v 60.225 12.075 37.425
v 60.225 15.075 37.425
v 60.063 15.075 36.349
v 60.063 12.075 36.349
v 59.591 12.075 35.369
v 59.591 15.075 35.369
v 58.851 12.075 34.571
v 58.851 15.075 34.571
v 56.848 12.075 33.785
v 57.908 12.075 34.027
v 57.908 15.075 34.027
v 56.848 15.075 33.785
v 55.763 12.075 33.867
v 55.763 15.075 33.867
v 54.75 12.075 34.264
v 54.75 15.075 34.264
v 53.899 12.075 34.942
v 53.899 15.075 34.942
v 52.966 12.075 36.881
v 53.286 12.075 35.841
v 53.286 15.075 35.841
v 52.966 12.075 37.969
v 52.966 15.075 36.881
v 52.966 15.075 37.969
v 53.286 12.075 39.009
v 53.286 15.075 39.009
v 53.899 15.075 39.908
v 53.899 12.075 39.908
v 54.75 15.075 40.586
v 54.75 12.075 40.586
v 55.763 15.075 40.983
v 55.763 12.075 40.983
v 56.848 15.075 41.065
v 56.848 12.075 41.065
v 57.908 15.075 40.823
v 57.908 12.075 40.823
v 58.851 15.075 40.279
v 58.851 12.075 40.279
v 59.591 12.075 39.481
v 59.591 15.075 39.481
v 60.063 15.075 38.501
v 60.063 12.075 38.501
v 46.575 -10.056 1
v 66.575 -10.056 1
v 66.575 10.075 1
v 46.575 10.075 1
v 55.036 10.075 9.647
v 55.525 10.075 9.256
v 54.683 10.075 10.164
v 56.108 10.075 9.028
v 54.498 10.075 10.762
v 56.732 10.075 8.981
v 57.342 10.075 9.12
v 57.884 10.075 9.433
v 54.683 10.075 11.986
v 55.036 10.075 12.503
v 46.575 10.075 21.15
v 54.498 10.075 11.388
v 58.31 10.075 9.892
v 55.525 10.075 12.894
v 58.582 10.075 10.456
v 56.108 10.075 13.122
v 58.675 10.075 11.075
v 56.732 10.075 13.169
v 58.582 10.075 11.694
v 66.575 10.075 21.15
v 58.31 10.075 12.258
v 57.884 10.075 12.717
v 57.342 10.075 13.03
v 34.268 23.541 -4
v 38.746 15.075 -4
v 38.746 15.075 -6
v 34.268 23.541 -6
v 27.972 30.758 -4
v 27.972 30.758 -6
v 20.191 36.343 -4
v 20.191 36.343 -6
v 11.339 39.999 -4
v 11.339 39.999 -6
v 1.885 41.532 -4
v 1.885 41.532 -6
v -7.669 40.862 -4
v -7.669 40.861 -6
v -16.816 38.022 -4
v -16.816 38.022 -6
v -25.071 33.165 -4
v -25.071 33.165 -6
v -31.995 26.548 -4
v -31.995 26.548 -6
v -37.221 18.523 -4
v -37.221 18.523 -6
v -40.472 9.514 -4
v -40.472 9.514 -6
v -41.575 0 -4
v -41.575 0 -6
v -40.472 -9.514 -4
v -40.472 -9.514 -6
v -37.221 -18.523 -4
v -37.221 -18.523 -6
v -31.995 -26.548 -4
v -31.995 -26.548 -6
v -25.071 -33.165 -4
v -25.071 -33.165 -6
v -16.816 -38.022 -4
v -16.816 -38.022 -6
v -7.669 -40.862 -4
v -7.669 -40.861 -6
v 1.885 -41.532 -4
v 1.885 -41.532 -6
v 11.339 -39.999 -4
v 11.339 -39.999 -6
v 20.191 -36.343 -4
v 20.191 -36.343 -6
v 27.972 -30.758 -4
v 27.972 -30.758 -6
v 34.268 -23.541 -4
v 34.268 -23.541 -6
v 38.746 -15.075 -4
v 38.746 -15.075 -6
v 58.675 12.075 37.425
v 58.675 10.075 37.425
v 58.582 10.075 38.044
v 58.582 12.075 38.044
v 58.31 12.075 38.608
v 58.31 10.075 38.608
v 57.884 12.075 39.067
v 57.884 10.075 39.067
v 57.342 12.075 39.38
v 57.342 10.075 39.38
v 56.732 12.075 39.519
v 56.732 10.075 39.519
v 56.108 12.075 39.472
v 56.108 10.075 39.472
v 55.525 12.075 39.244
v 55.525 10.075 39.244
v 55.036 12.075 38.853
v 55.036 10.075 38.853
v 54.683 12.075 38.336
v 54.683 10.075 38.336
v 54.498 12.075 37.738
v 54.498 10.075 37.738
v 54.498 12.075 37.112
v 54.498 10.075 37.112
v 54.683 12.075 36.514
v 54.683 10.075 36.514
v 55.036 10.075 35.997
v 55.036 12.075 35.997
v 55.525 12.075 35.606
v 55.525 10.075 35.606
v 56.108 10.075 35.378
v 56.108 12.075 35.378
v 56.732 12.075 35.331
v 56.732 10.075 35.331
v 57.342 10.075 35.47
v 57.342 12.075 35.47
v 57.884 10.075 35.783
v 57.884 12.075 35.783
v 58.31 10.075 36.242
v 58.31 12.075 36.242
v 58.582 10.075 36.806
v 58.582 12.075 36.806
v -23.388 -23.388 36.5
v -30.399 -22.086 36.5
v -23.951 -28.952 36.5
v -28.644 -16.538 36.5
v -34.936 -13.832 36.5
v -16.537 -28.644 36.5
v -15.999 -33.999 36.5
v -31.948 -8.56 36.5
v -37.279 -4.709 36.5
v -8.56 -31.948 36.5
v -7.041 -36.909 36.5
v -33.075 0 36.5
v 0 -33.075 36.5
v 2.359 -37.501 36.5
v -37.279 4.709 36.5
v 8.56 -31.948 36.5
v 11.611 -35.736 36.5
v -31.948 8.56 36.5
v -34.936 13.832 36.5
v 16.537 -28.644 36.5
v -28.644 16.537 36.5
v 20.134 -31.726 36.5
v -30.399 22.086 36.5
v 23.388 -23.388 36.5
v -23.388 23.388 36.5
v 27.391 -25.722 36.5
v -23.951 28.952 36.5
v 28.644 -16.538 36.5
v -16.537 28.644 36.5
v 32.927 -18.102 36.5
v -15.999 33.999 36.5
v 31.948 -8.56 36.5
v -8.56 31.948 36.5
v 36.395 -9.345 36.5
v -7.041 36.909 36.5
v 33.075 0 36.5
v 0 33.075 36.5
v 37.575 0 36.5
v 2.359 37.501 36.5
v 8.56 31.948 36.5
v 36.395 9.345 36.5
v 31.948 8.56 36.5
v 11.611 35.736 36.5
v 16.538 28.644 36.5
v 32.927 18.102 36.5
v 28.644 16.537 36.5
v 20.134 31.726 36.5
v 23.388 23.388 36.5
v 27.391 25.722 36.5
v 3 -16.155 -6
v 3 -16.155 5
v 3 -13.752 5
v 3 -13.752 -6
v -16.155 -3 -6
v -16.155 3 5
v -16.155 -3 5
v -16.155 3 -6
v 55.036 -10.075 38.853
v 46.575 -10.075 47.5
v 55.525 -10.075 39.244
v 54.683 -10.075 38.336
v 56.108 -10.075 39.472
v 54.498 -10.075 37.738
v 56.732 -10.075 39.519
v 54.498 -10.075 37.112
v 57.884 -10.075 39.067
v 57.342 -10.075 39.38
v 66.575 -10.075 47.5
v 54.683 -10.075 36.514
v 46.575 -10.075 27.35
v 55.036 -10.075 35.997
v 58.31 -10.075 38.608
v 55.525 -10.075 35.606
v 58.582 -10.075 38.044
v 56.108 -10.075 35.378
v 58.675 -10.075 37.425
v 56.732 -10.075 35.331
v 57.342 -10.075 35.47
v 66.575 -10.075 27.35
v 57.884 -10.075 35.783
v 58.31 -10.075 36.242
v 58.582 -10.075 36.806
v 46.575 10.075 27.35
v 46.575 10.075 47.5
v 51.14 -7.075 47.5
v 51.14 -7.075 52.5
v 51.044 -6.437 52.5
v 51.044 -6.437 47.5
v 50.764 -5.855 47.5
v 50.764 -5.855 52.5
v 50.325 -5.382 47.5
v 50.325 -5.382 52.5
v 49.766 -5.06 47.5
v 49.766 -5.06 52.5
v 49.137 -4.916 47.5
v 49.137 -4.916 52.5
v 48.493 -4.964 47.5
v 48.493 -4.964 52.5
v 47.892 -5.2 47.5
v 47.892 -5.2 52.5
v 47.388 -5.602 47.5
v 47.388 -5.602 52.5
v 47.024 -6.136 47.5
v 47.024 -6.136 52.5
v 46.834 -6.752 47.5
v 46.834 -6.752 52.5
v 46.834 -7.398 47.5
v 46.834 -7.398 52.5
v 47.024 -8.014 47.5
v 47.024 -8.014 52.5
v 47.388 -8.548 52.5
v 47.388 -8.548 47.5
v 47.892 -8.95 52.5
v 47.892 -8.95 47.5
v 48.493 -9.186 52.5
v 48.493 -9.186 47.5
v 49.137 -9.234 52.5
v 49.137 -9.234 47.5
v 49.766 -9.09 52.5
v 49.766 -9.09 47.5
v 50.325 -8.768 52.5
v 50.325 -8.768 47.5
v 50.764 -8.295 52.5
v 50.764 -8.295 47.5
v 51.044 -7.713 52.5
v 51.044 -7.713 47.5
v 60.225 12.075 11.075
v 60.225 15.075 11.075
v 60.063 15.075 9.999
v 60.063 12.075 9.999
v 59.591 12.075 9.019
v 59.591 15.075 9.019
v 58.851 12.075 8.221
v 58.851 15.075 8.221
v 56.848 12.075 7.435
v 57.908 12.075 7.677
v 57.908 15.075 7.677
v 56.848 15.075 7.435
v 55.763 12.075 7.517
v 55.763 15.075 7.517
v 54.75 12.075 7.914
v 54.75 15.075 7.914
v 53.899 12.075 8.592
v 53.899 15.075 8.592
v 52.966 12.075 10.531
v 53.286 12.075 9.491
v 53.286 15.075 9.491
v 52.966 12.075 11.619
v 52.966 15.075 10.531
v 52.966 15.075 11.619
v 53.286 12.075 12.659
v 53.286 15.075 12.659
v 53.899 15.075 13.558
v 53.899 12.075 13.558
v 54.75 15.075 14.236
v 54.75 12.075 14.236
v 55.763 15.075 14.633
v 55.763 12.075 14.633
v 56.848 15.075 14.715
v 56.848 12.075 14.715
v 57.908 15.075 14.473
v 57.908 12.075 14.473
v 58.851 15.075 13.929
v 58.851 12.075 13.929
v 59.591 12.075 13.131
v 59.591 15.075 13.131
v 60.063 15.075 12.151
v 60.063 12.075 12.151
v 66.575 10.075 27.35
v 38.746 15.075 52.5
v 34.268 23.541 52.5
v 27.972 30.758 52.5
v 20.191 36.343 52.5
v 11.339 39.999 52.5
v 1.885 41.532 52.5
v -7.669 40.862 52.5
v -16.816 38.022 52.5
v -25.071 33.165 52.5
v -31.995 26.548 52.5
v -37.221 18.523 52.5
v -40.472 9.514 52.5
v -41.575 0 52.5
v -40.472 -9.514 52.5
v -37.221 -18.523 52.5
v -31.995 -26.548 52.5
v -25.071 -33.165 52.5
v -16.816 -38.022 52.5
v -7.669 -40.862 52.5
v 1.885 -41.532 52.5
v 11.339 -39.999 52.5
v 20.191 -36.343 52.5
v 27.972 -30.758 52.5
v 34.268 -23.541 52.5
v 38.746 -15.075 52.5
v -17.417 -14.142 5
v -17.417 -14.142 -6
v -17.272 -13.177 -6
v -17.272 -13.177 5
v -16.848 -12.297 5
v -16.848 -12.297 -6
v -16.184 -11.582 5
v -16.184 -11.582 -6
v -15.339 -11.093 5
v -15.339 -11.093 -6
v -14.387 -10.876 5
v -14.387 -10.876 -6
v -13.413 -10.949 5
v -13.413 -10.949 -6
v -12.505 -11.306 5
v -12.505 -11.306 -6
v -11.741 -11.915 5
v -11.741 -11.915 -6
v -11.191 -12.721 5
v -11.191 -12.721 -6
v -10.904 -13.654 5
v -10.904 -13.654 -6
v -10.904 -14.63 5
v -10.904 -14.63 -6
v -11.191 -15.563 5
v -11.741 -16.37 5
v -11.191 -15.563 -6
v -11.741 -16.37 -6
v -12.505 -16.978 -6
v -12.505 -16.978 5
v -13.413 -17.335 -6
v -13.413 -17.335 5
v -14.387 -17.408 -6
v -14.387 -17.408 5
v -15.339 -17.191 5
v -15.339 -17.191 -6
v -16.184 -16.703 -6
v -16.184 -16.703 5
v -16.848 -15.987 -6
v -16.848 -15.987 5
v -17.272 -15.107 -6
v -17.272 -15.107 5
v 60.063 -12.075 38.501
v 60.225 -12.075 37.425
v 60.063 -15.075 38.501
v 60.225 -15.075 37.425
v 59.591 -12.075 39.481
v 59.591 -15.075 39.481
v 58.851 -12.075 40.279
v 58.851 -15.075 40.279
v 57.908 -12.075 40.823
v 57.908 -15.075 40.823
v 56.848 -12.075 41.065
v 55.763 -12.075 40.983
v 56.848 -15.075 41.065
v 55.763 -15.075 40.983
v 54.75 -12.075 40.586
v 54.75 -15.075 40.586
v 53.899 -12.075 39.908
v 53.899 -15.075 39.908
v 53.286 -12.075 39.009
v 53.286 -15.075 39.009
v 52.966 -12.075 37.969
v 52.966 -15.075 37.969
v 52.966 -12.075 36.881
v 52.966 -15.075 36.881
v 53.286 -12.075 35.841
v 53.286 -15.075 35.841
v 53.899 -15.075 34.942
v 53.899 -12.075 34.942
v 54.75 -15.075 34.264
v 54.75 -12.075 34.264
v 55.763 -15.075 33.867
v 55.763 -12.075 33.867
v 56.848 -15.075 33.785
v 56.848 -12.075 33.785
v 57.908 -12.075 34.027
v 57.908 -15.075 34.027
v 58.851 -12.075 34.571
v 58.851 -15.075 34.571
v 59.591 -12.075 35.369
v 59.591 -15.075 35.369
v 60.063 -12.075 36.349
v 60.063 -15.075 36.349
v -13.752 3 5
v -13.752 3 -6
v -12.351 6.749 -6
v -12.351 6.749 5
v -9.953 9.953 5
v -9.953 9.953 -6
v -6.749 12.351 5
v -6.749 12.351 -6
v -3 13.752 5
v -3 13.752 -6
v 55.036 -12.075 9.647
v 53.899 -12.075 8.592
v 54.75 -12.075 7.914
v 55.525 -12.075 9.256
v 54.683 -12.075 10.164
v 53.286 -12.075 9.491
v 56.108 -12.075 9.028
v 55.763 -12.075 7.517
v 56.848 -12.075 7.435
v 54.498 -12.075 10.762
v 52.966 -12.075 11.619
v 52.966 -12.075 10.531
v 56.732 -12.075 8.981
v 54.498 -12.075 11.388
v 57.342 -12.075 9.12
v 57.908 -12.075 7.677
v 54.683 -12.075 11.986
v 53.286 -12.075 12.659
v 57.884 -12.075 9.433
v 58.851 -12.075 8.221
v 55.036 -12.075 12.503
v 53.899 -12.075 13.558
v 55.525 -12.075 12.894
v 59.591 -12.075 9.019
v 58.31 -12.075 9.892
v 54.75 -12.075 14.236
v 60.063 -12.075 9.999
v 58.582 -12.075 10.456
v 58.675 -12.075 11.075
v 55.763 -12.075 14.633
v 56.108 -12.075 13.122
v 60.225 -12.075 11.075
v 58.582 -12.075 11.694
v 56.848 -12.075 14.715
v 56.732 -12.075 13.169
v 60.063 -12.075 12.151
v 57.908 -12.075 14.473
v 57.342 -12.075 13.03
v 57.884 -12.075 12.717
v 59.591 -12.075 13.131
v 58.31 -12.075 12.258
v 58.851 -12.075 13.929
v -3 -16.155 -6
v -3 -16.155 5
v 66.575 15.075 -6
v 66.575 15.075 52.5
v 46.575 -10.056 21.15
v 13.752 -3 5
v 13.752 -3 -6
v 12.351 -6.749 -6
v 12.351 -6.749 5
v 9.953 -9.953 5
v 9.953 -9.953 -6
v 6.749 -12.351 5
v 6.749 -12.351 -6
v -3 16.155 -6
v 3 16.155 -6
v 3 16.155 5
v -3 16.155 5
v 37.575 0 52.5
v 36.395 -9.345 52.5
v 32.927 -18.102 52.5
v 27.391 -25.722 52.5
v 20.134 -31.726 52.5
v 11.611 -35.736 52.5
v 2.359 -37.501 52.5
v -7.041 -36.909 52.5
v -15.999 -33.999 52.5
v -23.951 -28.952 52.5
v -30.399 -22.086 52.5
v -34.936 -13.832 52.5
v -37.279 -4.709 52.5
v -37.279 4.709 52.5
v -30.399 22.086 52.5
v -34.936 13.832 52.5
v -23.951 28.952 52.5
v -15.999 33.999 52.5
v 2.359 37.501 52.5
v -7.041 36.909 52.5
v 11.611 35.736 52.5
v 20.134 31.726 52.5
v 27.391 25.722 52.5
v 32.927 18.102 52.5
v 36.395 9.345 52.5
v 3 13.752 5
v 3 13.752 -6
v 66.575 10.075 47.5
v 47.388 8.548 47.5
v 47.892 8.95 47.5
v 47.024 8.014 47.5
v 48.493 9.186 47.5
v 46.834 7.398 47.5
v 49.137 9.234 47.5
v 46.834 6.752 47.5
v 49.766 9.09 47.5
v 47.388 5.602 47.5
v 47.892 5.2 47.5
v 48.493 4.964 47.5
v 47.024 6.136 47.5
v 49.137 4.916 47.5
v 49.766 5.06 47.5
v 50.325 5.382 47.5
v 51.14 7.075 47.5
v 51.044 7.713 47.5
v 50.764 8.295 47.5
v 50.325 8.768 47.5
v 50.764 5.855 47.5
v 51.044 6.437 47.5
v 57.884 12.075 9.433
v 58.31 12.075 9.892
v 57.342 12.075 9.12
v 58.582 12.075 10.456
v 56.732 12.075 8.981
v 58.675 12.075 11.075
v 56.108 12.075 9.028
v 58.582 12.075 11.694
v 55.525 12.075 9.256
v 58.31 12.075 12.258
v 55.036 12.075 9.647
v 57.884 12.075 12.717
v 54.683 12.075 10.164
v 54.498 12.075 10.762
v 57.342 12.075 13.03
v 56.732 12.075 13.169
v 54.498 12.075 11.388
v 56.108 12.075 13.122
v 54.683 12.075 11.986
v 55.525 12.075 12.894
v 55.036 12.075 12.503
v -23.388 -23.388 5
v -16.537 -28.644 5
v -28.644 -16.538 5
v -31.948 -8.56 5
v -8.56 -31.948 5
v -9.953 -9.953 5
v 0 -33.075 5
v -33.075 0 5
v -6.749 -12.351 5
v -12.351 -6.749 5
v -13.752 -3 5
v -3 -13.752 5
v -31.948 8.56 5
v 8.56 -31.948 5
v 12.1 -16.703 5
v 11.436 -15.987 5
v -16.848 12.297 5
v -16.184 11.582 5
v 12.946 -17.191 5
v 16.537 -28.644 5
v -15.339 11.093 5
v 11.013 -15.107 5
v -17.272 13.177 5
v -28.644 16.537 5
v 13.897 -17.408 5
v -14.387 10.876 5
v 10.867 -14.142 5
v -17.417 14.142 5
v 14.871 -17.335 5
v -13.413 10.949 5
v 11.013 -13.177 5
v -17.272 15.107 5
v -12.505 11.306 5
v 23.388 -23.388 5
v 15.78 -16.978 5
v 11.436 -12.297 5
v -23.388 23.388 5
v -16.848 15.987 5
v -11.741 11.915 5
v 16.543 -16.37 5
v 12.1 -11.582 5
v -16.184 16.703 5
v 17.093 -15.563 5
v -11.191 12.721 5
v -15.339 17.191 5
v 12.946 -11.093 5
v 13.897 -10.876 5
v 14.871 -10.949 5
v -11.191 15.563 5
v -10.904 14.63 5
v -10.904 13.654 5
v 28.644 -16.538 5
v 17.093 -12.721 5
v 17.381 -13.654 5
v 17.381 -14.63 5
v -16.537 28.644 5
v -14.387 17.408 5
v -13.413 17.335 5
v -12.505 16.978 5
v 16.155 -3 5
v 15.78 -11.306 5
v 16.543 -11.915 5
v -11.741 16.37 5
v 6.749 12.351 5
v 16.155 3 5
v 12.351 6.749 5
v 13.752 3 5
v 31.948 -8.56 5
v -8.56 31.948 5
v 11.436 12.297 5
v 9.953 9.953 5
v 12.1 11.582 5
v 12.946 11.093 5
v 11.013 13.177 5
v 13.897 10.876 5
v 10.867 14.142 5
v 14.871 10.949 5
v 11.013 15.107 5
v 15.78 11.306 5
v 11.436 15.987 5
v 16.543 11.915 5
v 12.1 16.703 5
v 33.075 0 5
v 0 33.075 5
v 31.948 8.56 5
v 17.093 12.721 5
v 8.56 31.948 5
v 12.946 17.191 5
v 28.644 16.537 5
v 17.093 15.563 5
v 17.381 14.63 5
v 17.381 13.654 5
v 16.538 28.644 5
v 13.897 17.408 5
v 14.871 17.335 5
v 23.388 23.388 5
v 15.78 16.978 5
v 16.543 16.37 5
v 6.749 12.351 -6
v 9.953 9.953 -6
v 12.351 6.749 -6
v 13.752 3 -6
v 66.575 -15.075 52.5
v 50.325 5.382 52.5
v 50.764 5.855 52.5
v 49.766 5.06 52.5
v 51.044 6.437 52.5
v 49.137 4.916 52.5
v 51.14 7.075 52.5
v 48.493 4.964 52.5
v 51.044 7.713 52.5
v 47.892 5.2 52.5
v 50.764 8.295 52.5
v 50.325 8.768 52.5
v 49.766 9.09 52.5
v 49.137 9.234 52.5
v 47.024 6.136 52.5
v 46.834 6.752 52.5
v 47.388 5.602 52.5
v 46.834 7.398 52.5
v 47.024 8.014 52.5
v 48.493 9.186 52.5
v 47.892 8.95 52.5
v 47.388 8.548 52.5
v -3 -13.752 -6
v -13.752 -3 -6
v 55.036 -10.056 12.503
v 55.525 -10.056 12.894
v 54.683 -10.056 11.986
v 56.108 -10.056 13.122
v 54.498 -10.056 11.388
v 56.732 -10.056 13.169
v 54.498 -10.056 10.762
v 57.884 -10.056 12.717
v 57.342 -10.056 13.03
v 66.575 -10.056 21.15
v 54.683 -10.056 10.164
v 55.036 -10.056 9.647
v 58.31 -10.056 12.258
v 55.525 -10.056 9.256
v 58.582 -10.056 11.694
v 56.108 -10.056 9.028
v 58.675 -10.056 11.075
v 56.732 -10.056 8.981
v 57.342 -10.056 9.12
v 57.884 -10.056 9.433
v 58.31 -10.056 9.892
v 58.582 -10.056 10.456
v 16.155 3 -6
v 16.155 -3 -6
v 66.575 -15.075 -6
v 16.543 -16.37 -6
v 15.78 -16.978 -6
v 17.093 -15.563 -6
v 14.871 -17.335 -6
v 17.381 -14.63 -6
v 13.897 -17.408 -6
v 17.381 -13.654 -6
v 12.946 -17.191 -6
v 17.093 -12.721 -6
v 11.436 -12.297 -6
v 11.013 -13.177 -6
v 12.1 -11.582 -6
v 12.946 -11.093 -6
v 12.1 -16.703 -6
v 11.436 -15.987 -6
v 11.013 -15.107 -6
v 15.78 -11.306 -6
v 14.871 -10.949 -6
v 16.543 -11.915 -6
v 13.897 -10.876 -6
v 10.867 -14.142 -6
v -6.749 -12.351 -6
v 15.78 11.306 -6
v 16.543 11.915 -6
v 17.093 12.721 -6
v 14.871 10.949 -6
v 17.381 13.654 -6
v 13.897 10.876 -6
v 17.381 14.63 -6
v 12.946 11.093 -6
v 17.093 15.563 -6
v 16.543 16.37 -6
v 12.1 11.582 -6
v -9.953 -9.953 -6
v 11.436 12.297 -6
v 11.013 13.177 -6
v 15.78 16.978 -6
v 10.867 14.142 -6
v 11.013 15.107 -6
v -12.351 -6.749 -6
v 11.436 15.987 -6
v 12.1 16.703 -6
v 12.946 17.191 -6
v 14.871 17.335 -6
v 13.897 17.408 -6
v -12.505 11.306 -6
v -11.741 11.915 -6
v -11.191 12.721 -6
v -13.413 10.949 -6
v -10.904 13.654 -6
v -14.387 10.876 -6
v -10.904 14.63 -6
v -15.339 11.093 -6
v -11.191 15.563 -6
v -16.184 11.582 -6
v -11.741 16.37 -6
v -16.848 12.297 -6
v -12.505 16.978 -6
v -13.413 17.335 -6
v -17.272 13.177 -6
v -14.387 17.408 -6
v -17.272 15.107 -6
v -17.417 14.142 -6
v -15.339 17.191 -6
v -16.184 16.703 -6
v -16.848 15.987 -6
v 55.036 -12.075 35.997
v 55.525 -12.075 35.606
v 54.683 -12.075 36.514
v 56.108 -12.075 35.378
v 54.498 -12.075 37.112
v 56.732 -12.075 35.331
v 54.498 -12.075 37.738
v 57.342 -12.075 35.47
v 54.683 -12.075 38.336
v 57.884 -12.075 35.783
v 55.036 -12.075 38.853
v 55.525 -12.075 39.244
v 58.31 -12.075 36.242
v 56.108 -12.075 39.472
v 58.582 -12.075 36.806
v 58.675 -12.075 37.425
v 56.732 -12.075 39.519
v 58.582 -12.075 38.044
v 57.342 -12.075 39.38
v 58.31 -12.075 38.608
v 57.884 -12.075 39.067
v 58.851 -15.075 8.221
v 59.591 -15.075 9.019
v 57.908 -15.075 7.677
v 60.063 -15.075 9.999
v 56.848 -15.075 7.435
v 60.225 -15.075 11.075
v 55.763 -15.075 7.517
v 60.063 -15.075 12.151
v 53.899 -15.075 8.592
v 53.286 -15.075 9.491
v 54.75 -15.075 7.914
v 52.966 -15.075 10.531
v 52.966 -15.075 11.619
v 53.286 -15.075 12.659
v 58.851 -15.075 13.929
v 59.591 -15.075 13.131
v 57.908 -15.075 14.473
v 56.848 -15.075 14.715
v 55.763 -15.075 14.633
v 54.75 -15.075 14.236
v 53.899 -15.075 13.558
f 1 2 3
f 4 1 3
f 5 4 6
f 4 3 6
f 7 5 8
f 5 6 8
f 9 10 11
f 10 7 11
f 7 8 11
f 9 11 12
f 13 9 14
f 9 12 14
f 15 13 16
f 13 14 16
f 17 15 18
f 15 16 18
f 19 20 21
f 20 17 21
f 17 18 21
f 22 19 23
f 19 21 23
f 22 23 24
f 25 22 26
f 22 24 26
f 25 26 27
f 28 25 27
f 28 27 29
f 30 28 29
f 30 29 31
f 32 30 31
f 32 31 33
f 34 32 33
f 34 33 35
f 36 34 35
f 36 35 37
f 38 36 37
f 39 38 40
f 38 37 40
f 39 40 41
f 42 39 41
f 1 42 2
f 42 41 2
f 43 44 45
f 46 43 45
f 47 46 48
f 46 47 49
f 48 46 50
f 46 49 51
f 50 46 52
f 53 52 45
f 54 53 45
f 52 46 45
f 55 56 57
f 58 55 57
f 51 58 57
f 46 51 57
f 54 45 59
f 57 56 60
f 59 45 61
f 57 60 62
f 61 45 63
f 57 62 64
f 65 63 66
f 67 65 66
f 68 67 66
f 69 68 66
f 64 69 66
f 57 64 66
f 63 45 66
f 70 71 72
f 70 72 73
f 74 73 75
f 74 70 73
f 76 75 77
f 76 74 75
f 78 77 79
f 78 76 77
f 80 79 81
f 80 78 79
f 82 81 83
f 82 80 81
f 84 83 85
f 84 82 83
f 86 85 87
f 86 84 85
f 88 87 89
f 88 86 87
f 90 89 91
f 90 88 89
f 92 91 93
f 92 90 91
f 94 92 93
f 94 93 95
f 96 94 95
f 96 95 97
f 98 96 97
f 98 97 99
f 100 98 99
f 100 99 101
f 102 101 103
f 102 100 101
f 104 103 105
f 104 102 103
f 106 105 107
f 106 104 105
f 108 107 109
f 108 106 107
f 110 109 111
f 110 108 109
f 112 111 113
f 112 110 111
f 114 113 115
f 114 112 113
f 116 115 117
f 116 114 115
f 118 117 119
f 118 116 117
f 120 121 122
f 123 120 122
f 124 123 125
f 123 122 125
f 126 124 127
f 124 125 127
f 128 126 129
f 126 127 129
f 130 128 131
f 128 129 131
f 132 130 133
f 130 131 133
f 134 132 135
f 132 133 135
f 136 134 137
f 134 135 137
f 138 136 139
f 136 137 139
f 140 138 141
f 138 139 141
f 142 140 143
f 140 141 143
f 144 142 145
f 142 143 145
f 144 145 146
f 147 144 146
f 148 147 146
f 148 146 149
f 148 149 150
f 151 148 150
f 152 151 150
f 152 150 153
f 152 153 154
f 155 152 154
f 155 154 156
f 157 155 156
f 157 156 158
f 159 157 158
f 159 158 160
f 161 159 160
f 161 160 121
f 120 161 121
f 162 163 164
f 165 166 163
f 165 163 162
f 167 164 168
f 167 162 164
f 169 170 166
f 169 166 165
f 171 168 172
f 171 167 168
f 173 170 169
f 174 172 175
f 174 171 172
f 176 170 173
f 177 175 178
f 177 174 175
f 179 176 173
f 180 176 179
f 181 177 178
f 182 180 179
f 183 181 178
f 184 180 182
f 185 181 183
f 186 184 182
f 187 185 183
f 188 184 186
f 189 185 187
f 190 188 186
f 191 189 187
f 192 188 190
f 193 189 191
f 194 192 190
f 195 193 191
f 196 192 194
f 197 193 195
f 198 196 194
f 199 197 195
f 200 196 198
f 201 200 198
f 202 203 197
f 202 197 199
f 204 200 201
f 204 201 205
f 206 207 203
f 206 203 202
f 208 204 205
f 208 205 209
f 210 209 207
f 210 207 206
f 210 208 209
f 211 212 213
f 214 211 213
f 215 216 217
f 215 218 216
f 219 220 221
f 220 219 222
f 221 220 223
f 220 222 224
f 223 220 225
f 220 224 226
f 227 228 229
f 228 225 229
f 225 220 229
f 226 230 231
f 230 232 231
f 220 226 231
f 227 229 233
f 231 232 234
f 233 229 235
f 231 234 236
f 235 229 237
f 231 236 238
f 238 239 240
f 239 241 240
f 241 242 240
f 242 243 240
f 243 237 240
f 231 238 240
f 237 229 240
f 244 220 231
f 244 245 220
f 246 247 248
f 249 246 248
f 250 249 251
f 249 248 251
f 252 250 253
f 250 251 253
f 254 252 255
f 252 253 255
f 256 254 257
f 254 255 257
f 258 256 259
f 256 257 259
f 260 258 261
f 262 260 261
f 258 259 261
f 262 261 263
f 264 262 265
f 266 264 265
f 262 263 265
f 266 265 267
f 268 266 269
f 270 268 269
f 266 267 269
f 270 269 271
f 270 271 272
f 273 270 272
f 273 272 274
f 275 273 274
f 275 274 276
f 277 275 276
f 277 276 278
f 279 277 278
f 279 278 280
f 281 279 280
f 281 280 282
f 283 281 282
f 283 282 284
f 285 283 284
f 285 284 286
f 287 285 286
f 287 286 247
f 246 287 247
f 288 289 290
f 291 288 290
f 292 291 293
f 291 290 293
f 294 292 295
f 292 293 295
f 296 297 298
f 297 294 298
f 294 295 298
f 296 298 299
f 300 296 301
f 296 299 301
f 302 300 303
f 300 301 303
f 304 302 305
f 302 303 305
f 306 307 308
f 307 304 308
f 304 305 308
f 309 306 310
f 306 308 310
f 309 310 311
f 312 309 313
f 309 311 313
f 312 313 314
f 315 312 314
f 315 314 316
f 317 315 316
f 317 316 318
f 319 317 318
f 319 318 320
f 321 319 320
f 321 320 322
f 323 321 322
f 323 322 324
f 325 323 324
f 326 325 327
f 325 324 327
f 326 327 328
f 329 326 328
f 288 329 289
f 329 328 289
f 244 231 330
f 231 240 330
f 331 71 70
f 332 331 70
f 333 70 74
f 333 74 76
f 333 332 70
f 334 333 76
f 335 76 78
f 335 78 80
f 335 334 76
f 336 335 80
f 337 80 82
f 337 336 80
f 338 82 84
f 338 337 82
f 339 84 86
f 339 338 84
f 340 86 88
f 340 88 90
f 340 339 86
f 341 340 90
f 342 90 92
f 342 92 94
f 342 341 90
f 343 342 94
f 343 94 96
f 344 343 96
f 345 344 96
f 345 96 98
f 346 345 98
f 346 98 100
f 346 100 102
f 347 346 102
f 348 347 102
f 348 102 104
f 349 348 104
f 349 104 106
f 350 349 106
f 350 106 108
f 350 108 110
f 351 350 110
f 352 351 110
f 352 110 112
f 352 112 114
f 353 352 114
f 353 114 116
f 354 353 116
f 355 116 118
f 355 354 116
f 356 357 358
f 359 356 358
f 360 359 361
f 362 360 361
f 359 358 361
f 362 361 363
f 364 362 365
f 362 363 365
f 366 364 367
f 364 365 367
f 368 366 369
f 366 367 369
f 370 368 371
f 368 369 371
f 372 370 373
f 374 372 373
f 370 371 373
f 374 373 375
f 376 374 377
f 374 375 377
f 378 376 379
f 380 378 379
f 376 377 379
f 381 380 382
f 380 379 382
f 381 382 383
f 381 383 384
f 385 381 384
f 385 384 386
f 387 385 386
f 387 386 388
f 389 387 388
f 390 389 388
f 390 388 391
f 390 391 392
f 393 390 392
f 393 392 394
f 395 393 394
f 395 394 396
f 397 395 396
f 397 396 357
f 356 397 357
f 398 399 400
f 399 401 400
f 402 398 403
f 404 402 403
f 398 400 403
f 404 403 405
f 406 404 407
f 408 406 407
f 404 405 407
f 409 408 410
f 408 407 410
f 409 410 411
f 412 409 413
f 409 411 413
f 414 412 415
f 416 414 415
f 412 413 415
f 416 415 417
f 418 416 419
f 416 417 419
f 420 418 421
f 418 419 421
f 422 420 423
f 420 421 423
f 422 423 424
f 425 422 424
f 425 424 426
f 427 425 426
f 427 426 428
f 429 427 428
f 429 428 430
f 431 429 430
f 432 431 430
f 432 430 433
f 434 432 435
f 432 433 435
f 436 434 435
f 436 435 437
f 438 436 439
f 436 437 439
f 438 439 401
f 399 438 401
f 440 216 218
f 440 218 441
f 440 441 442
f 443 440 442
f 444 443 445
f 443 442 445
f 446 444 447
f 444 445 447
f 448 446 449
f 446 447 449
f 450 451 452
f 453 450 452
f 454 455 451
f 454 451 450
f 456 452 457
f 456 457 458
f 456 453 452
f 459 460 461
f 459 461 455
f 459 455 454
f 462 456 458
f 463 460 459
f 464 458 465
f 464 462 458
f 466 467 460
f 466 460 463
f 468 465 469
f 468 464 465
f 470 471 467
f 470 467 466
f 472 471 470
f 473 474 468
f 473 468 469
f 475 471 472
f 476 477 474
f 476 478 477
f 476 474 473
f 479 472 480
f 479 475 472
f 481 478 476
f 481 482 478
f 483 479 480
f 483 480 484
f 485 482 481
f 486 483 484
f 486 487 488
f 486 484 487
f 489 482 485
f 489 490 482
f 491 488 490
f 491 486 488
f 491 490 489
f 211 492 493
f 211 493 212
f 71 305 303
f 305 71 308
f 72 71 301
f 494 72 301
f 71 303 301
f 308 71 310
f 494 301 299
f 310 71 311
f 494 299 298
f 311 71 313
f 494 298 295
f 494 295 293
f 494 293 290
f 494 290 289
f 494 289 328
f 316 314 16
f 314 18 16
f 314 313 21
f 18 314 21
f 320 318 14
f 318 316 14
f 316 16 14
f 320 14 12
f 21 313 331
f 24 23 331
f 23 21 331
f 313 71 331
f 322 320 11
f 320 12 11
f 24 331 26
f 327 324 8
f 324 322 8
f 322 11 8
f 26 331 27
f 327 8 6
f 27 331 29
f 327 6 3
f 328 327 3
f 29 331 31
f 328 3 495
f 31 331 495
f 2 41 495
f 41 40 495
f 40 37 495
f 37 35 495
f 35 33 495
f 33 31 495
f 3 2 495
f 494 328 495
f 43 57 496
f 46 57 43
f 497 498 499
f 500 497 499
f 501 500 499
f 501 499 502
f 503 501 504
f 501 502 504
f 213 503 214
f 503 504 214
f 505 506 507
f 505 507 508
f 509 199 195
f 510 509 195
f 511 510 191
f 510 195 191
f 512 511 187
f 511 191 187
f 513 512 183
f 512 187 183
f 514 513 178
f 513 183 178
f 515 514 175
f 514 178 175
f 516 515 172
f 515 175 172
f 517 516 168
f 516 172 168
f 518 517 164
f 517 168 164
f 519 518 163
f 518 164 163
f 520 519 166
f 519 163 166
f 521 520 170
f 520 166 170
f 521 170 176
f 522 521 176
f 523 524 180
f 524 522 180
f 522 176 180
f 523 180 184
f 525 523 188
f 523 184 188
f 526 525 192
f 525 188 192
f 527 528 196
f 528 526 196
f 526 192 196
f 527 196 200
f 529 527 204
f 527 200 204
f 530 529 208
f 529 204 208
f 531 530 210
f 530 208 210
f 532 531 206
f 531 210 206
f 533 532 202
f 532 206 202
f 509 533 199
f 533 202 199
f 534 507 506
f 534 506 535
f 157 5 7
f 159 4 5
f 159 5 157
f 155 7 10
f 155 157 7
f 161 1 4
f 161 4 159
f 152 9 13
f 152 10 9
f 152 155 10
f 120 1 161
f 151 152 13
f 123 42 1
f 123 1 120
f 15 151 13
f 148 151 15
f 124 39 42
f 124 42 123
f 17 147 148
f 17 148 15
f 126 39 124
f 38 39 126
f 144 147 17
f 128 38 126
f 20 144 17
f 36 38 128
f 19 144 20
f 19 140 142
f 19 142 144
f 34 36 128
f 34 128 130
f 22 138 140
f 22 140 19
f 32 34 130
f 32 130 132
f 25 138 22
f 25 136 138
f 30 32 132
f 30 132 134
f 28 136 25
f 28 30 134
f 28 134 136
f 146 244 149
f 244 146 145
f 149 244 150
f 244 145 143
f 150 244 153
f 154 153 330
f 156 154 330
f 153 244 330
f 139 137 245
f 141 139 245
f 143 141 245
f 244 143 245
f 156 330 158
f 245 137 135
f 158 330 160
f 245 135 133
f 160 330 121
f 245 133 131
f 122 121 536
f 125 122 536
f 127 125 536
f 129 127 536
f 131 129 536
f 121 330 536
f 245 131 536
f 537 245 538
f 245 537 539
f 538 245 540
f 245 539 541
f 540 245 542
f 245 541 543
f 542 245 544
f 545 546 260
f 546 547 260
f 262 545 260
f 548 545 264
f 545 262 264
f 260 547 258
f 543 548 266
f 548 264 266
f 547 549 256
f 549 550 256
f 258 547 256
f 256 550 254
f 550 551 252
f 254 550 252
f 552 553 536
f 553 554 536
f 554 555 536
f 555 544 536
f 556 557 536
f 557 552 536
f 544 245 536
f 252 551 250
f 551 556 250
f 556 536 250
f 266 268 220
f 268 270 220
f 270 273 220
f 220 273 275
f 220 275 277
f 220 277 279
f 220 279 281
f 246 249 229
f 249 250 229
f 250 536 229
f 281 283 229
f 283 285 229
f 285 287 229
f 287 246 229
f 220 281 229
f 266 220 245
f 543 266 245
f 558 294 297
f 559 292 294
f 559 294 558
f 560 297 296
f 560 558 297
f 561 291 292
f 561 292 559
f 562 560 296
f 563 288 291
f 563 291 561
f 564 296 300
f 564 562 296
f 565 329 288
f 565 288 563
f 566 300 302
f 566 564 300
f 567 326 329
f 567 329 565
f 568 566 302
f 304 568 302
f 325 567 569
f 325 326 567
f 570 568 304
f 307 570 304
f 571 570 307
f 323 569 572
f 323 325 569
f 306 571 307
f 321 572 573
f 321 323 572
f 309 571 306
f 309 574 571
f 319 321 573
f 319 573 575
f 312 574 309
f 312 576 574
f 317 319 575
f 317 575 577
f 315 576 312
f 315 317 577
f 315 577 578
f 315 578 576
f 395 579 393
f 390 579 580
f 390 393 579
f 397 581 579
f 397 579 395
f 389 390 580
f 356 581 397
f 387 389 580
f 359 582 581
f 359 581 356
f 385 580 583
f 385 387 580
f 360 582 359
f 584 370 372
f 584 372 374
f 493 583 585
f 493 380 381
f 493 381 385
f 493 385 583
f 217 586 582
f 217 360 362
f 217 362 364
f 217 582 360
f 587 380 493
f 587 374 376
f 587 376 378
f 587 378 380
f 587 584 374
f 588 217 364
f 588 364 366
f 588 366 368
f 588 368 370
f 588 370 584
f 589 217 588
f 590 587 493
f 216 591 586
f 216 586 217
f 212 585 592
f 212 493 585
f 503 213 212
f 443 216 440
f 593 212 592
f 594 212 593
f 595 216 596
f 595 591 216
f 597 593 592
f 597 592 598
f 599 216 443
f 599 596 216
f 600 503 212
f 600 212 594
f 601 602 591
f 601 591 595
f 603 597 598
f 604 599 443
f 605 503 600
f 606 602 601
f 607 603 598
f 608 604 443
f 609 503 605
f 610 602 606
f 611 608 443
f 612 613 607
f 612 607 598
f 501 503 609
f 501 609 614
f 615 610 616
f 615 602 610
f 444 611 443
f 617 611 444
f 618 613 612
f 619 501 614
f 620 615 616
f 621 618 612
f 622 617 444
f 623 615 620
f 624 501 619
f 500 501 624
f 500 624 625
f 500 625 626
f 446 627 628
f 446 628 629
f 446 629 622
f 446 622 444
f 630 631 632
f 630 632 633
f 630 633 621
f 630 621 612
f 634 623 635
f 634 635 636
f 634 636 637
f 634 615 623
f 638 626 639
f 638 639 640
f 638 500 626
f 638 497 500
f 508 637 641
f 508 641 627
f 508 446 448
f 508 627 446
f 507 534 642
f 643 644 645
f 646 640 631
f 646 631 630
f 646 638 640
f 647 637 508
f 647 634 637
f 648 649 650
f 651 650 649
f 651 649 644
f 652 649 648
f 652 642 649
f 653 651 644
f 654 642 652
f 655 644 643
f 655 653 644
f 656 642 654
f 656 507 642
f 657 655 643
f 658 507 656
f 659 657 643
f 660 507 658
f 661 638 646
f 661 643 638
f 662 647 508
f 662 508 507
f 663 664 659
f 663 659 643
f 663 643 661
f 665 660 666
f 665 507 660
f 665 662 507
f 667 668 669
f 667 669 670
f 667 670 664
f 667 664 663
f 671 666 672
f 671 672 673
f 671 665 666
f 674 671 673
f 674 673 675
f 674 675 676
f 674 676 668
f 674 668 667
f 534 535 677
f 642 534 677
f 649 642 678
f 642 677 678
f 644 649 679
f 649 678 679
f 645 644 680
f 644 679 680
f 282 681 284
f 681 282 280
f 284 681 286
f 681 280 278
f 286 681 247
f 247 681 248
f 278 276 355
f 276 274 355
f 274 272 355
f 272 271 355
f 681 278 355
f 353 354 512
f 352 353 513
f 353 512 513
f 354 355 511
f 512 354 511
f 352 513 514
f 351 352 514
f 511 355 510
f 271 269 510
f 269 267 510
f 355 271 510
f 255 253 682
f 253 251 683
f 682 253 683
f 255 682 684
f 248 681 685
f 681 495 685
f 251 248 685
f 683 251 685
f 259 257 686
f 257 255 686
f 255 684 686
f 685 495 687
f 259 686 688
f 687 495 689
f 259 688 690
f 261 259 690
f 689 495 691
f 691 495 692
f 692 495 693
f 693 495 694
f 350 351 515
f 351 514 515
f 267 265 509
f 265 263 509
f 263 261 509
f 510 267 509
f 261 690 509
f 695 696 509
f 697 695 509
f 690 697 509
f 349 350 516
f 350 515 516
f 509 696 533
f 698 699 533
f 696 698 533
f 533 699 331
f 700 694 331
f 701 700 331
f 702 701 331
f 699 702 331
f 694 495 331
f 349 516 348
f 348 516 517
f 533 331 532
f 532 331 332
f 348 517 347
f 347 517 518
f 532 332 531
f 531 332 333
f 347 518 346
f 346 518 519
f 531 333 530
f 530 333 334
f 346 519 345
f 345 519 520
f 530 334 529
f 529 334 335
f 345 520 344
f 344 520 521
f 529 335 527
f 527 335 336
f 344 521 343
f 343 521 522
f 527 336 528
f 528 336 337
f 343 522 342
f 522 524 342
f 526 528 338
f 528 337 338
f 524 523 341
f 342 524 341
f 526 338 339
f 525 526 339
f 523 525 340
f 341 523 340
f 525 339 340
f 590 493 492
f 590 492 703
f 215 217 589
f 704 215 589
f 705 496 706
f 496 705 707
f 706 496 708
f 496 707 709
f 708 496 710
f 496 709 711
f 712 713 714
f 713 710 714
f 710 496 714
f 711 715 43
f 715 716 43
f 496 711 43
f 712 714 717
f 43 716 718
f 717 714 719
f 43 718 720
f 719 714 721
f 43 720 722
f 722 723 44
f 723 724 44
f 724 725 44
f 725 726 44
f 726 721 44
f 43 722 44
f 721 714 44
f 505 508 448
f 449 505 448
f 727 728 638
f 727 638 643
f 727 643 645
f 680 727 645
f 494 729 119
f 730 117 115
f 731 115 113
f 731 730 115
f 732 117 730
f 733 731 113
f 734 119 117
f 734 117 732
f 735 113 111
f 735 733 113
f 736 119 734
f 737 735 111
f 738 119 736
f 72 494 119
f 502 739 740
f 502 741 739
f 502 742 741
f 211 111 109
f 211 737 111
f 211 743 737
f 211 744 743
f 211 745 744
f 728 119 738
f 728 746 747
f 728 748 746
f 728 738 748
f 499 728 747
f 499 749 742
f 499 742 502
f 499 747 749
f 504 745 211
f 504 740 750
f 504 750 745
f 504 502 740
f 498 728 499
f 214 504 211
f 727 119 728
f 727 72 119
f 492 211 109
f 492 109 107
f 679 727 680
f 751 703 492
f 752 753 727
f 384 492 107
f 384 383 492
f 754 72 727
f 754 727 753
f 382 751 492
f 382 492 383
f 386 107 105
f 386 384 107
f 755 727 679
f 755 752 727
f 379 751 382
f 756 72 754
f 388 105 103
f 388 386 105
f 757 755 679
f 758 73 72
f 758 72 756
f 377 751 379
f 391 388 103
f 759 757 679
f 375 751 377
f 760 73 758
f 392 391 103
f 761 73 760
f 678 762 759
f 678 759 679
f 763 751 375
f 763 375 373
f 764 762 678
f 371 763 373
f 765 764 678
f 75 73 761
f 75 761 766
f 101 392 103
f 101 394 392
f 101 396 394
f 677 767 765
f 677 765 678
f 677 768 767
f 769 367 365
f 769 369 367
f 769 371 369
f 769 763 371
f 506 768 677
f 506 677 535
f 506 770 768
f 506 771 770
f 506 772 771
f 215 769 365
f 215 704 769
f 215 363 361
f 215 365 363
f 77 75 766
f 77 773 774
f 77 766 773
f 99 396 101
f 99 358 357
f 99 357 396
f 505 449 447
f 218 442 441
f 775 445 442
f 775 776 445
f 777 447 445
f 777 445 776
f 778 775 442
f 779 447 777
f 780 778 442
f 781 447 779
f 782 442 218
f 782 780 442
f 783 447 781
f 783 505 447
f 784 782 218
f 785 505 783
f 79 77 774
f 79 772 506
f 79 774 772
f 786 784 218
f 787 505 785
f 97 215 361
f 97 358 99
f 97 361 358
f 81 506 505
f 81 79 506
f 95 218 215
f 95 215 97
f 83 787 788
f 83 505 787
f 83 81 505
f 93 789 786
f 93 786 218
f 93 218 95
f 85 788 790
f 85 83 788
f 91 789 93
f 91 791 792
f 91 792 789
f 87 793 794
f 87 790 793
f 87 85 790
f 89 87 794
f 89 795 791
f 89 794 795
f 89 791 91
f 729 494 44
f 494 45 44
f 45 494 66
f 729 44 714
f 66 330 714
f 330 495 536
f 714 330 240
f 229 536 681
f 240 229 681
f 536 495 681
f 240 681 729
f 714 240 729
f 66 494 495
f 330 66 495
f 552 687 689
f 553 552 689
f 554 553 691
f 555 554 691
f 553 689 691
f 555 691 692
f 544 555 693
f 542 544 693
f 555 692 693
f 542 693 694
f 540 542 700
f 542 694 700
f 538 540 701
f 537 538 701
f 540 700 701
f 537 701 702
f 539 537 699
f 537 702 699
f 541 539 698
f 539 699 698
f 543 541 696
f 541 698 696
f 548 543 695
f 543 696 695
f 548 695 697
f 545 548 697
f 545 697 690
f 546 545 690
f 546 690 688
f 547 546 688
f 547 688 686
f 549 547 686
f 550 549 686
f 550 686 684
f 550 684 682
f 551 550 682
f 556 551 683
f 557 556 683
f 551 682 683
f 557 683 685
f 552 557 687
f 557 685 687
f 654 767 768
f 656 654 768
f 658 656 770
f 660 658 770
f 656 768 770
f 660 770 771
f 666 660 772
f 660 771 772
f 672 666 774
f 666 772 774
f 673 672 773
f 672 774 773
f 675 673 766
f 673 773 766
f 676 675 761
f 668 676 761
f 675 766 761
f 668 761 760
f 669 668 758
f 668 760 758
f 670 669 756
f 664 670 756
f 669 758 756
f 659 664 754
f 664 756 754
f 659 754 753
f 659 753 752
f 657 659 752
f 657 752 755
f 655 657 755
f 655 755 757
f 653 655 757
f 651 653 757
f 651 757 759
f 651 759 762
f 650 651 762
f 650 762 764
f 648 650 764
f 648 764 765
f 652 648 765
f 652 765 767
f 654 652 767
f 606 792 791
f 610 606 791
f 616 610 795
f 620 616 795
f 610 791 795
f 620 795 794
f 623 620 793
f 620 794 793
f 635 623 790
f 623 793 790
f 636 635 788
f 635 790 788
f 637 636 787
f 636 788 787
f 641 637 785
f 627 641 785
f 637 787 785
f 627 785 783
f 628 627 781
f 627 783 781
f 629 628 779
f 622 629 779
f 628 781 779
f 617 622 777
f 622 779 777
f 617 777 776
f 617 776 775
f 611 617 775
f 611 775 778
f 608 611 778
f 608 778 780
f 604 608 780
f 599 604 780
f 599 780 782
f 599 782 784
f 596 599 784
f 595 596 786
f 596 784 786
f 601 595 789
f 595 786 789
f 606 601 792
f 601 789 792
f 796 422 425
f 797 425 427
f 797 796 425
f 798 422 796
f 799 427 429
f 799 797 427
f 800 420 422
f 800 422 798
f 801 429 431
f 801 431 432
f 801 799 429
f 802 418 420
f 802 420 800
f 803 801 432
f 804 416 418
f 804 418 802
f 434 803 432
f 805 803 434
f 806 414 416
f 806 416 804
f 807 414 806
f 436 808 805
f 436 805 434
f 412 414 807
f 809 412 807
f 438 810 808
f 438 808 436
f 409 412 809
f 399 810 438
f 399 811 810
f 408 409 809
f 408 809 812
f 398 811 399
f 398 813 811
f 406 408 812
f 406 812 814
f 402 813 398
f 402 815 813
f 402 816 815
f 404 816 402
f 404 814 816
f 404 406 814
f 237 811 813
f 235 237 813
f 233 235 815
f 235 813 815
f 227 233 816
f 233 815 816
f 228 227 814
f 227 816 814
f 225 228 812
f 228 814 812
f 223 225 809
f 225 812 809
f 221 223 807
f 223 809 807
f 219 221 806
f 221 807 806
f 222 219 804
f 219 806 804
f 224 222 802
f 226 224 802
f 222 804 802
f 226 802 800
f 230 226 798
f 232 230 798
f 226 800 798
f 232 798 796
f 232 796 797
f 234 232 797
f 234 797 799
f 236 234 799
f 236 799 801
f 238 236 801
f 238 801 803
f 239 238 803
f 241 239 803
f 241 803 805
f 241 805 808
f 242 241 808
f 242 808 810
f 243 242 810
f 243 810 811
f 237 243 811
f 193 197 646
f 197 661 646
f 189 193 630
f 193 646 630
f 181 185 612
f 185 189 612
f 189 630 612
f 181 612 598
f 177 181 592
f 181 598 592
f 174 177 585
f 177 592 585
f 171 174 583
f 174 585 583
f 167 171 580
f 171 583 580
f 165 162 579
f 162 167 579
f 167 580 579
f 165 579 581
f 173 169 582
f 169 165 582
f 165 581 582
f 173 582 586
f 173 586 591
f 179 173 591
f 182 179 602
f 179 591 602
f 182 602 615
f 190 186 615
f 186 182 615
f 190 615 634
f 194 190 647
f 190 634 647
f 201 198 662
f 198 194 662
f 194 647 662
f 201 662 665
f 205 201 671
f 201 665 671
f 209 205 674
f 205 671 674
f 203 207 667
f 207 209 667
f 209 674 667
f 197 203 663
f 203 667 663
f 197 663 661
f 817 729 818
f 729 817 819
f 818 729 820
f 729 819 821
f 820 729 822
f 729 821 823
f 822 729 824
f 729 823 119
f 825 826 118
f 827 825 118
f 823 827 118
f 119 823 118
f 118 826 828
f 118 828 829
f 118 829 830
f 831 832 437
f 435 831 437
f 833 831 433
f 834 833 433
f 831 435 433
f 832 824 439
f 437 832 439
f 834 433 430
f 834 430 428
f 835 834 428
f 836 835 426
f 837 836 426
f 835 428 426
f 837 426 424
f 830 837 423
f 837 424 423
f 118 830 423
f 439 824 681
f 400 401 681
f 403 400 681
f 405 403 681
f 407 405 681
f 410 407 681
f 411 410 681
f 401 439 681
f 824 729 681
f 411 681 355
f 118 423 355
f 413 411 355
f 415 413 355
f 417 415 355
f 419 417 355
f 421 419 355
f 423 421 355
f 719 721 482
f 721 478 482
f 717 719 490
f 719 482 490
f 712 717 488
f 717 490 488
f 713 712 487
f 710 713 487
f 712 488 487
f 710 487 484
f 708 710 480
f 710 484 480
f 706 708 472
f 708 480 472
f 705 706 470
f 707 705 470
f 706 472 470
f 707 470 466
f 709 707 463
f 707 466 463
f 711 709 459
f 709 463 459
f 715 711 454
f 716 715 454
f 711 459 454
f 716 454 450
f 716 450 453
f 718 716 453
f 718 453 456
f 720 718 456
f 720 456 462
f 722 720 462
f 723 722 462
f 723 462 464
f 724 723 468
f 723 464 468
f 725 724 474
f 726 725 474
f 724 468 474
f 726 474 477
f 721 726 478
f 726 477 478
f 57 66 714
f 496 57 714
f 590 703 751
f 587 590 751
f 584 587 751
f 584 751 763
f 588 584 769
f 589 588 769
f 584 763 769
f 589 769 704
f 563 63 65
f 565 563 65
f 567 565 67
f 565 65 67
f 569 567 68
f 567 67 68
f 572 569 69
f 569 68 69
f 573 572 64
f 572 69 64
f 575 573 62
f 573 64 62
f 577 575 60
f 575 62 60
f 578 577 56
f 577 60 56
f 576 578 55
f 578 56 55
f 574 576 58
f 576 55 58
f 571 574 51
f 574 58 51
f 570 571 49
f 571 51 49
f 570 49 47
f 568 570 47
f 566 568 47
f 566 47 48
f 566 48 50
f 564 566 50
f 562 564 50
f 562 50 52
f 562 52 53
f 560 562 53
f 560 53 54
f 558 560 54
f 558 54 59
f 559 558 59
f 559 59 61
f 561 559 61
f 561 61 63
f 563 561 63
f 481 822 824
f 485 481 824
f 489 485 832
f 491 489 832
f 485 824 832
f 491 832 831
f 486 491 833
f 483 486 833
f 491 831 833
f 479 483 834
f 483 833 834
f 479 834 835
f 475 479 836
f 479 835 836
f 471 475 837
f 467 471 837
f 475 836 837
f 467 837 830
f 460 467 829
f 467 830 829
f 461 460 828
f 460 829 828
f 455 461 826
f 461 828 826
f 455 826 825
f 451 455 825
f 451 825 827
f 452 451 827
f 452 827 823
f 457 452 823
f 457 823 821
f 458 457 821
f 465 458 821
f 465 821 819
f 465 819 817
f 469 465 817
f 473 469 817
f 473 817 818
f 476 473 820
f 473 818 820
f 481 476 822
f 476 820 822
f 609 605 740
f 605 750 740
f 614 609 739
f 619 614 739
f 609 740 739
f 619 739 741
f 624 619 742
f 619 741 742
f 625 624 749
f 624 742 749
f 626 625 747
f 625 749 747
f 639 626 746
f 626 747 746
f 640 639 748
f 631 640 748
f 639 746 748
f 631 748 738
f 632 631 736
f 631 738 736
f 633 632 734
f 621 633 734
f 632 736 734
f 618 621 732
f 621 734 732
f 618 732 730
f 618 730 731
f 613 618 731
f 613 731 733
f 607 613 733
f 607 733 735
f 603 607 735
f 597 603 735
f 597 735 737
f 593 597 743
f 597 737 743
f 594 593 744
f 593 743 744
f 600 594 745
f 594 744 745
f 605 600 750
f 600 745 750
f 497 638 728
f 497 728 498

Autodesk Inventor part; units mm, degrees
ref_plane "YZ Plane" through (0, 0, 0) normal (1, 0, 0) x (0, 1, 0)
sketch "草圖1" plane through (0, 0, 0) normal (0, 0, 1) x (1, 0, 0)
  circle A0 centre (0, 0) radius 19.6
  circle A1 centre (0, 0) radius 41.575
  dimension "d0" = 39.2
  dimension "d1" = 83.15
extrude "擠出1" add sketch "草圖1" along normal blind 5
sketch "草圖2" plane through (0, 0, 0) normal (0, 0, -1) x (-1, 0, 0)
  circle A0 centre (0, 0) radius 41.575 projected
extrude "擠出2" add sketch "草圖2" along normal blind 4
sketch "草圖4" plane through (0, 0, 5) normal (0, 0, 1) x (1, 0, 0)
  circle A0 centre (0, 0) radius 41.575 projected
  circle A1 centre (0, 0) radius 37.575
  dimension "d14" = 4
extrude "擠出4" add sketch "草圖4" along normal blind 47.5
sketch "草圖5" plane through (0, 0, 5) normal (0, 0, 1) x (1, 0, 0)
  circle A0 centre (0, 0) radius 37.575 projected
  circle A1 centre (0, 0) radius 33.075
  dimension "d17" = 4.5
extrude "擠出5" add sketch "草圖5" along normal blind 31.5
sketch "草圖6" plane through (0, 0, -4) normal (0, 0, -1) x (-1, 0, 0)
  line L0 (-66.575, 15.075) -> (-66.575, -15.075)
  line L1 (-66.575, 15.075) -> (-38.7456, 15.075)
  circle A0 centre (0, 0) radius 41.575 projected
  line L2 (-66.575, -15.075) -> (-38.7456, -15.075)
  point P0 (-41.575, 0)
  dimension "d20" = 30.15
  dimension "d22" = 15.075
  dimension "d25" = 25
extrude "擠出6" add sketch "草圖6" against normal up to surface (56.5 mm away) contours L1 A0 L2 L0
sketch "草圖7" plane through (66.575, -15.075, -4) normal (1, 0, 0) x (0, 0, -1)
  line L0 (-56.5, 30.15) -> (-56.5, 0) projected
  line L1 (0, 0) -> (-56.5, 0) projected
  line L2 (0, 30.15) -> (0, 0) projected
  line L3 (0, 30.15) -> (-56.5, 30.15) projected
  line L4 (-51.5, 5) -> (-31.35, 5)
  line L5 (-31.35, 5) -> (-31.35, 25.15)
  line L6 (-31.35, 25.15) -> (-51.5, 25.15)
  line L7 (-51.5, 25.15) -> (-51.5, 5)
  line L8 (-51.5, 5) -> (-31.35, 25.15) construction
  line L9 (-31.35, 5) -> (-51.5, 25.15) construction
  line L10 (-25.15, 5.0185) -> (-5, 5.0185)
  line L11 (-5, 5.0185) -> (-5, 25.15)
  line L12 (-5, 25.15) -> (-25.15, 25.15)
  line L13 (-25.15, 25.15) -> (-25.15, 5.0185)
  line L14 (-25.15, 5.0185) -> (-5, 25.15) construction
  line L15 (-5, 5.0185) -> (-25.15, 25.15) construction
  point P0 (-4, 15.075)
  point P1 (-41.425, 15.075)
  point P2 (-15.075, 15.0842)
  dimension "d26" = 20.15
  dimension "d27" = 20.15
  dimension "d28" = 20.15
  dimension "d29" = 5
  dimension "d30" = 5
  dimension "d31" = 5
extrude "擠出7" cut sketch "草圖7" against normal blind 20 contours L7 L6 L5 L4 | L13 L12 L11 L10
sketch "草圖8" plane through (0, 0, 52.5) normal (0, 0, 1) x (1, 0, 0)
  line L0 (52.9465, -6.0747) -> (44.9865, -6.0635) projected
  line L1 (52.9465, -6.0747) -> (52.9551, 0.0253) projected
  line L2 (44.9951, 0.0365) -> (52.9551, 0.0253) projected
  line L3 (44.9865, -6.0635) -> (44.9951, 0.0365) projected
  circle A0 centre (48.975, -7.075) radius 2.165
  circle A1 centre (48.975, 7.075) radius 2.165
  line L4 (38.7456, -15.075) -> (66.575, -15.075) projected
  line L5 (66.575, 15.075) -> (40.0902, 15.075) projected
  point P0 (0, 0)
  dimension "d36" = 4.33
  dimension "d37" = 4.33
  dimension "d38" = 8
  dimension "d39" = 8
extrude "擠出8" cut sketch "草圖8" against normal up to surface (5 mm away) contours A0 L0 | L0 A0 | A1
ref_plane "工作平面6" through (38.7456, -15.075, 50.5) normal (0, -1, 0) x (1, 0, 0)
sketch "草圖9" plane through (38.7456, -15.075, 50.5) normal (0, -1, 0) x (1, 0, 0)
  line L0 (27.8294, -29.35) -> (27.8294, -49.5) projected
  line L1 (27.8294, -29.35) -> (7.8294, -29.35) projected
  line L2 (7.8294, -29.35) -> (7.8294, -49.5) projected
  line L3 (27.8294, -49.5) -> (7.8294, -49.5) projected
  line L4 (27.8294, -3) -> (27.8294, -23.15) projected
  line L5 (27.8294, -3) -> (7.8294, -3) projected
  line L6 (7.8294, -3) -> (7.8294, -23.15) projected
  line L7 (27.8294, -23.15) -> (7.8294, -23.15) projected
  circle A0 centre (17.8294, -39.425) radius 2.1
  circle A1 centre (17.8294, -13.075) radius 2.1
  point P0 (-38.7456, -50.5)
  dimension "d42" = 4.2
  dimension "d43" = 4.2
extrude "擠出9" cut sketch "草圖9" against normal through all contours A0 | A1
ref_plane "工作平面7" through (38.7456, -15.075, 50.5) normal (0, -1, 0) x (1, 0, 0)
sketch "草圖10" plane through (38.7456, -15.075, 50.5) normal (0, -1, 0) x (1, 0, 0)
  circle A0 centre (17.8294, -39.425) radius 2.1 projected
  circle A1 centre (17.8294, -39.425) radius 3.65
  circle A2 centre (17.8294, -13.075) radius 2.1 projected
  circle A3 centre (17.8294, -13.075) radius 3.65
  point P0 (-38.7456, -50.5)
  dimension "d46" = 7.3
  dimension "d47" = 7.3
extrude "擠出10" cut sketch "草圖10" against normal blind 3
sketch "草圖14" plane through (0, 0, 5) normal (0, 0, 1) x (1, 0, 0)
  circle A0 centre (0, 0) radius 19.6 projected
extrude "擠出13" add sketch "草圖14" against normal up to surface (9 mm away)
sketch "草圖19" plane through (0, 0, -4) normal (0, 0, -1) x (-1, 0, 0)
  arc A0 (-38.7456, -15.075) -> (-38.7456, 15.075) centre (0, 0) ccw projected
  line L0 (-38.7456, 15.075) -> (-66.575, 15.075) projected
  line L1 (-66.575, 15.075) -> (-66.575, -15.075) projected
  line L2 (-66.575, -15.075) -> (-38.7456, -15.075) projected
extrude "擠出18" add sketch "草圖19" along normal blind 2
sketch "草圖20" plane through (0, 0, -6) normal (0, 0, -1) x (-1, 0, 0)
  circle A0 centre (0, 0) radius 20 construction
  line L0 (0, 0) -> (14.1421, -14.1421) construction
  line L1 (0, 0) -> (20, 0) construction
  circle A1 centre (14.1421, -14.1421) radius 3.275
  circle A2 centre (14.1421, 14.1421) radius 3.275
  circle A3 centre (-14.1421, 14.1421) radius 3.275
  circle A4 centre (-14.1421, -14.1421) radius 3.275
  circle A5 centre (0, 0) radius 33.075 projected
  circle A6 centre (0, 0) radius 14.075
  line L2 (3, -16.1547) -> (-3, -16.1547)
  line L3 (-3, -16.1547) -> (-3, -13.7516)
  line L4 (3, -16.1547) -> (3, -13.7516)
  line L5 (16.1547, 3) -> (13.7516, 3)
  line L6 (16.1547, -3) -> (13.7516, -3)
  line L7 (16.1547, 3) -> (16.1547, -3)
  line L8 (-3, 16.1547) -> (-3, 13.7516)
  line L9 (3, 16.1547) -> (3, 13.7516)
  line L10 (-3, 16.1547) -> (3, 16.1547)
  line L11 (-16.1547, -3) -> (-13.7516, -3)
  line L12 (-16.1547, 3) -> (-13.7516, 3)
  line L13 (-16.1547, -3) -> (-16.1547, 3)
  dimension "d83" = 40
  dimension "d84" = 45
  dimension "d85" = 6.55
  dimension "d88" = 360
  dimension "d90" = 28.15
  dimension "d91" = 6
  dimension "d92" = 3
  dimension "d95" = 360
extrude "擠出19" cut sketch "草圖20" against normal up to surface (11 mm away) contours A1 | A2 | A3 | A4 | A6 | A6 L5 L7 L6 | A6 L8 L10 L9 | L4 L2 L3 A6 | A6 L11 L13 L12
mirror "鏡射2" about plane through (0, 0, 0) normal (0, 1, 0) of "擠出10"
equation "\"d22\" = 0.5 * d20"
equation "\"d27\" = d26"
equation "\"d28\" = d26"
properties part number "j2 moving part option2_3D 列印"
